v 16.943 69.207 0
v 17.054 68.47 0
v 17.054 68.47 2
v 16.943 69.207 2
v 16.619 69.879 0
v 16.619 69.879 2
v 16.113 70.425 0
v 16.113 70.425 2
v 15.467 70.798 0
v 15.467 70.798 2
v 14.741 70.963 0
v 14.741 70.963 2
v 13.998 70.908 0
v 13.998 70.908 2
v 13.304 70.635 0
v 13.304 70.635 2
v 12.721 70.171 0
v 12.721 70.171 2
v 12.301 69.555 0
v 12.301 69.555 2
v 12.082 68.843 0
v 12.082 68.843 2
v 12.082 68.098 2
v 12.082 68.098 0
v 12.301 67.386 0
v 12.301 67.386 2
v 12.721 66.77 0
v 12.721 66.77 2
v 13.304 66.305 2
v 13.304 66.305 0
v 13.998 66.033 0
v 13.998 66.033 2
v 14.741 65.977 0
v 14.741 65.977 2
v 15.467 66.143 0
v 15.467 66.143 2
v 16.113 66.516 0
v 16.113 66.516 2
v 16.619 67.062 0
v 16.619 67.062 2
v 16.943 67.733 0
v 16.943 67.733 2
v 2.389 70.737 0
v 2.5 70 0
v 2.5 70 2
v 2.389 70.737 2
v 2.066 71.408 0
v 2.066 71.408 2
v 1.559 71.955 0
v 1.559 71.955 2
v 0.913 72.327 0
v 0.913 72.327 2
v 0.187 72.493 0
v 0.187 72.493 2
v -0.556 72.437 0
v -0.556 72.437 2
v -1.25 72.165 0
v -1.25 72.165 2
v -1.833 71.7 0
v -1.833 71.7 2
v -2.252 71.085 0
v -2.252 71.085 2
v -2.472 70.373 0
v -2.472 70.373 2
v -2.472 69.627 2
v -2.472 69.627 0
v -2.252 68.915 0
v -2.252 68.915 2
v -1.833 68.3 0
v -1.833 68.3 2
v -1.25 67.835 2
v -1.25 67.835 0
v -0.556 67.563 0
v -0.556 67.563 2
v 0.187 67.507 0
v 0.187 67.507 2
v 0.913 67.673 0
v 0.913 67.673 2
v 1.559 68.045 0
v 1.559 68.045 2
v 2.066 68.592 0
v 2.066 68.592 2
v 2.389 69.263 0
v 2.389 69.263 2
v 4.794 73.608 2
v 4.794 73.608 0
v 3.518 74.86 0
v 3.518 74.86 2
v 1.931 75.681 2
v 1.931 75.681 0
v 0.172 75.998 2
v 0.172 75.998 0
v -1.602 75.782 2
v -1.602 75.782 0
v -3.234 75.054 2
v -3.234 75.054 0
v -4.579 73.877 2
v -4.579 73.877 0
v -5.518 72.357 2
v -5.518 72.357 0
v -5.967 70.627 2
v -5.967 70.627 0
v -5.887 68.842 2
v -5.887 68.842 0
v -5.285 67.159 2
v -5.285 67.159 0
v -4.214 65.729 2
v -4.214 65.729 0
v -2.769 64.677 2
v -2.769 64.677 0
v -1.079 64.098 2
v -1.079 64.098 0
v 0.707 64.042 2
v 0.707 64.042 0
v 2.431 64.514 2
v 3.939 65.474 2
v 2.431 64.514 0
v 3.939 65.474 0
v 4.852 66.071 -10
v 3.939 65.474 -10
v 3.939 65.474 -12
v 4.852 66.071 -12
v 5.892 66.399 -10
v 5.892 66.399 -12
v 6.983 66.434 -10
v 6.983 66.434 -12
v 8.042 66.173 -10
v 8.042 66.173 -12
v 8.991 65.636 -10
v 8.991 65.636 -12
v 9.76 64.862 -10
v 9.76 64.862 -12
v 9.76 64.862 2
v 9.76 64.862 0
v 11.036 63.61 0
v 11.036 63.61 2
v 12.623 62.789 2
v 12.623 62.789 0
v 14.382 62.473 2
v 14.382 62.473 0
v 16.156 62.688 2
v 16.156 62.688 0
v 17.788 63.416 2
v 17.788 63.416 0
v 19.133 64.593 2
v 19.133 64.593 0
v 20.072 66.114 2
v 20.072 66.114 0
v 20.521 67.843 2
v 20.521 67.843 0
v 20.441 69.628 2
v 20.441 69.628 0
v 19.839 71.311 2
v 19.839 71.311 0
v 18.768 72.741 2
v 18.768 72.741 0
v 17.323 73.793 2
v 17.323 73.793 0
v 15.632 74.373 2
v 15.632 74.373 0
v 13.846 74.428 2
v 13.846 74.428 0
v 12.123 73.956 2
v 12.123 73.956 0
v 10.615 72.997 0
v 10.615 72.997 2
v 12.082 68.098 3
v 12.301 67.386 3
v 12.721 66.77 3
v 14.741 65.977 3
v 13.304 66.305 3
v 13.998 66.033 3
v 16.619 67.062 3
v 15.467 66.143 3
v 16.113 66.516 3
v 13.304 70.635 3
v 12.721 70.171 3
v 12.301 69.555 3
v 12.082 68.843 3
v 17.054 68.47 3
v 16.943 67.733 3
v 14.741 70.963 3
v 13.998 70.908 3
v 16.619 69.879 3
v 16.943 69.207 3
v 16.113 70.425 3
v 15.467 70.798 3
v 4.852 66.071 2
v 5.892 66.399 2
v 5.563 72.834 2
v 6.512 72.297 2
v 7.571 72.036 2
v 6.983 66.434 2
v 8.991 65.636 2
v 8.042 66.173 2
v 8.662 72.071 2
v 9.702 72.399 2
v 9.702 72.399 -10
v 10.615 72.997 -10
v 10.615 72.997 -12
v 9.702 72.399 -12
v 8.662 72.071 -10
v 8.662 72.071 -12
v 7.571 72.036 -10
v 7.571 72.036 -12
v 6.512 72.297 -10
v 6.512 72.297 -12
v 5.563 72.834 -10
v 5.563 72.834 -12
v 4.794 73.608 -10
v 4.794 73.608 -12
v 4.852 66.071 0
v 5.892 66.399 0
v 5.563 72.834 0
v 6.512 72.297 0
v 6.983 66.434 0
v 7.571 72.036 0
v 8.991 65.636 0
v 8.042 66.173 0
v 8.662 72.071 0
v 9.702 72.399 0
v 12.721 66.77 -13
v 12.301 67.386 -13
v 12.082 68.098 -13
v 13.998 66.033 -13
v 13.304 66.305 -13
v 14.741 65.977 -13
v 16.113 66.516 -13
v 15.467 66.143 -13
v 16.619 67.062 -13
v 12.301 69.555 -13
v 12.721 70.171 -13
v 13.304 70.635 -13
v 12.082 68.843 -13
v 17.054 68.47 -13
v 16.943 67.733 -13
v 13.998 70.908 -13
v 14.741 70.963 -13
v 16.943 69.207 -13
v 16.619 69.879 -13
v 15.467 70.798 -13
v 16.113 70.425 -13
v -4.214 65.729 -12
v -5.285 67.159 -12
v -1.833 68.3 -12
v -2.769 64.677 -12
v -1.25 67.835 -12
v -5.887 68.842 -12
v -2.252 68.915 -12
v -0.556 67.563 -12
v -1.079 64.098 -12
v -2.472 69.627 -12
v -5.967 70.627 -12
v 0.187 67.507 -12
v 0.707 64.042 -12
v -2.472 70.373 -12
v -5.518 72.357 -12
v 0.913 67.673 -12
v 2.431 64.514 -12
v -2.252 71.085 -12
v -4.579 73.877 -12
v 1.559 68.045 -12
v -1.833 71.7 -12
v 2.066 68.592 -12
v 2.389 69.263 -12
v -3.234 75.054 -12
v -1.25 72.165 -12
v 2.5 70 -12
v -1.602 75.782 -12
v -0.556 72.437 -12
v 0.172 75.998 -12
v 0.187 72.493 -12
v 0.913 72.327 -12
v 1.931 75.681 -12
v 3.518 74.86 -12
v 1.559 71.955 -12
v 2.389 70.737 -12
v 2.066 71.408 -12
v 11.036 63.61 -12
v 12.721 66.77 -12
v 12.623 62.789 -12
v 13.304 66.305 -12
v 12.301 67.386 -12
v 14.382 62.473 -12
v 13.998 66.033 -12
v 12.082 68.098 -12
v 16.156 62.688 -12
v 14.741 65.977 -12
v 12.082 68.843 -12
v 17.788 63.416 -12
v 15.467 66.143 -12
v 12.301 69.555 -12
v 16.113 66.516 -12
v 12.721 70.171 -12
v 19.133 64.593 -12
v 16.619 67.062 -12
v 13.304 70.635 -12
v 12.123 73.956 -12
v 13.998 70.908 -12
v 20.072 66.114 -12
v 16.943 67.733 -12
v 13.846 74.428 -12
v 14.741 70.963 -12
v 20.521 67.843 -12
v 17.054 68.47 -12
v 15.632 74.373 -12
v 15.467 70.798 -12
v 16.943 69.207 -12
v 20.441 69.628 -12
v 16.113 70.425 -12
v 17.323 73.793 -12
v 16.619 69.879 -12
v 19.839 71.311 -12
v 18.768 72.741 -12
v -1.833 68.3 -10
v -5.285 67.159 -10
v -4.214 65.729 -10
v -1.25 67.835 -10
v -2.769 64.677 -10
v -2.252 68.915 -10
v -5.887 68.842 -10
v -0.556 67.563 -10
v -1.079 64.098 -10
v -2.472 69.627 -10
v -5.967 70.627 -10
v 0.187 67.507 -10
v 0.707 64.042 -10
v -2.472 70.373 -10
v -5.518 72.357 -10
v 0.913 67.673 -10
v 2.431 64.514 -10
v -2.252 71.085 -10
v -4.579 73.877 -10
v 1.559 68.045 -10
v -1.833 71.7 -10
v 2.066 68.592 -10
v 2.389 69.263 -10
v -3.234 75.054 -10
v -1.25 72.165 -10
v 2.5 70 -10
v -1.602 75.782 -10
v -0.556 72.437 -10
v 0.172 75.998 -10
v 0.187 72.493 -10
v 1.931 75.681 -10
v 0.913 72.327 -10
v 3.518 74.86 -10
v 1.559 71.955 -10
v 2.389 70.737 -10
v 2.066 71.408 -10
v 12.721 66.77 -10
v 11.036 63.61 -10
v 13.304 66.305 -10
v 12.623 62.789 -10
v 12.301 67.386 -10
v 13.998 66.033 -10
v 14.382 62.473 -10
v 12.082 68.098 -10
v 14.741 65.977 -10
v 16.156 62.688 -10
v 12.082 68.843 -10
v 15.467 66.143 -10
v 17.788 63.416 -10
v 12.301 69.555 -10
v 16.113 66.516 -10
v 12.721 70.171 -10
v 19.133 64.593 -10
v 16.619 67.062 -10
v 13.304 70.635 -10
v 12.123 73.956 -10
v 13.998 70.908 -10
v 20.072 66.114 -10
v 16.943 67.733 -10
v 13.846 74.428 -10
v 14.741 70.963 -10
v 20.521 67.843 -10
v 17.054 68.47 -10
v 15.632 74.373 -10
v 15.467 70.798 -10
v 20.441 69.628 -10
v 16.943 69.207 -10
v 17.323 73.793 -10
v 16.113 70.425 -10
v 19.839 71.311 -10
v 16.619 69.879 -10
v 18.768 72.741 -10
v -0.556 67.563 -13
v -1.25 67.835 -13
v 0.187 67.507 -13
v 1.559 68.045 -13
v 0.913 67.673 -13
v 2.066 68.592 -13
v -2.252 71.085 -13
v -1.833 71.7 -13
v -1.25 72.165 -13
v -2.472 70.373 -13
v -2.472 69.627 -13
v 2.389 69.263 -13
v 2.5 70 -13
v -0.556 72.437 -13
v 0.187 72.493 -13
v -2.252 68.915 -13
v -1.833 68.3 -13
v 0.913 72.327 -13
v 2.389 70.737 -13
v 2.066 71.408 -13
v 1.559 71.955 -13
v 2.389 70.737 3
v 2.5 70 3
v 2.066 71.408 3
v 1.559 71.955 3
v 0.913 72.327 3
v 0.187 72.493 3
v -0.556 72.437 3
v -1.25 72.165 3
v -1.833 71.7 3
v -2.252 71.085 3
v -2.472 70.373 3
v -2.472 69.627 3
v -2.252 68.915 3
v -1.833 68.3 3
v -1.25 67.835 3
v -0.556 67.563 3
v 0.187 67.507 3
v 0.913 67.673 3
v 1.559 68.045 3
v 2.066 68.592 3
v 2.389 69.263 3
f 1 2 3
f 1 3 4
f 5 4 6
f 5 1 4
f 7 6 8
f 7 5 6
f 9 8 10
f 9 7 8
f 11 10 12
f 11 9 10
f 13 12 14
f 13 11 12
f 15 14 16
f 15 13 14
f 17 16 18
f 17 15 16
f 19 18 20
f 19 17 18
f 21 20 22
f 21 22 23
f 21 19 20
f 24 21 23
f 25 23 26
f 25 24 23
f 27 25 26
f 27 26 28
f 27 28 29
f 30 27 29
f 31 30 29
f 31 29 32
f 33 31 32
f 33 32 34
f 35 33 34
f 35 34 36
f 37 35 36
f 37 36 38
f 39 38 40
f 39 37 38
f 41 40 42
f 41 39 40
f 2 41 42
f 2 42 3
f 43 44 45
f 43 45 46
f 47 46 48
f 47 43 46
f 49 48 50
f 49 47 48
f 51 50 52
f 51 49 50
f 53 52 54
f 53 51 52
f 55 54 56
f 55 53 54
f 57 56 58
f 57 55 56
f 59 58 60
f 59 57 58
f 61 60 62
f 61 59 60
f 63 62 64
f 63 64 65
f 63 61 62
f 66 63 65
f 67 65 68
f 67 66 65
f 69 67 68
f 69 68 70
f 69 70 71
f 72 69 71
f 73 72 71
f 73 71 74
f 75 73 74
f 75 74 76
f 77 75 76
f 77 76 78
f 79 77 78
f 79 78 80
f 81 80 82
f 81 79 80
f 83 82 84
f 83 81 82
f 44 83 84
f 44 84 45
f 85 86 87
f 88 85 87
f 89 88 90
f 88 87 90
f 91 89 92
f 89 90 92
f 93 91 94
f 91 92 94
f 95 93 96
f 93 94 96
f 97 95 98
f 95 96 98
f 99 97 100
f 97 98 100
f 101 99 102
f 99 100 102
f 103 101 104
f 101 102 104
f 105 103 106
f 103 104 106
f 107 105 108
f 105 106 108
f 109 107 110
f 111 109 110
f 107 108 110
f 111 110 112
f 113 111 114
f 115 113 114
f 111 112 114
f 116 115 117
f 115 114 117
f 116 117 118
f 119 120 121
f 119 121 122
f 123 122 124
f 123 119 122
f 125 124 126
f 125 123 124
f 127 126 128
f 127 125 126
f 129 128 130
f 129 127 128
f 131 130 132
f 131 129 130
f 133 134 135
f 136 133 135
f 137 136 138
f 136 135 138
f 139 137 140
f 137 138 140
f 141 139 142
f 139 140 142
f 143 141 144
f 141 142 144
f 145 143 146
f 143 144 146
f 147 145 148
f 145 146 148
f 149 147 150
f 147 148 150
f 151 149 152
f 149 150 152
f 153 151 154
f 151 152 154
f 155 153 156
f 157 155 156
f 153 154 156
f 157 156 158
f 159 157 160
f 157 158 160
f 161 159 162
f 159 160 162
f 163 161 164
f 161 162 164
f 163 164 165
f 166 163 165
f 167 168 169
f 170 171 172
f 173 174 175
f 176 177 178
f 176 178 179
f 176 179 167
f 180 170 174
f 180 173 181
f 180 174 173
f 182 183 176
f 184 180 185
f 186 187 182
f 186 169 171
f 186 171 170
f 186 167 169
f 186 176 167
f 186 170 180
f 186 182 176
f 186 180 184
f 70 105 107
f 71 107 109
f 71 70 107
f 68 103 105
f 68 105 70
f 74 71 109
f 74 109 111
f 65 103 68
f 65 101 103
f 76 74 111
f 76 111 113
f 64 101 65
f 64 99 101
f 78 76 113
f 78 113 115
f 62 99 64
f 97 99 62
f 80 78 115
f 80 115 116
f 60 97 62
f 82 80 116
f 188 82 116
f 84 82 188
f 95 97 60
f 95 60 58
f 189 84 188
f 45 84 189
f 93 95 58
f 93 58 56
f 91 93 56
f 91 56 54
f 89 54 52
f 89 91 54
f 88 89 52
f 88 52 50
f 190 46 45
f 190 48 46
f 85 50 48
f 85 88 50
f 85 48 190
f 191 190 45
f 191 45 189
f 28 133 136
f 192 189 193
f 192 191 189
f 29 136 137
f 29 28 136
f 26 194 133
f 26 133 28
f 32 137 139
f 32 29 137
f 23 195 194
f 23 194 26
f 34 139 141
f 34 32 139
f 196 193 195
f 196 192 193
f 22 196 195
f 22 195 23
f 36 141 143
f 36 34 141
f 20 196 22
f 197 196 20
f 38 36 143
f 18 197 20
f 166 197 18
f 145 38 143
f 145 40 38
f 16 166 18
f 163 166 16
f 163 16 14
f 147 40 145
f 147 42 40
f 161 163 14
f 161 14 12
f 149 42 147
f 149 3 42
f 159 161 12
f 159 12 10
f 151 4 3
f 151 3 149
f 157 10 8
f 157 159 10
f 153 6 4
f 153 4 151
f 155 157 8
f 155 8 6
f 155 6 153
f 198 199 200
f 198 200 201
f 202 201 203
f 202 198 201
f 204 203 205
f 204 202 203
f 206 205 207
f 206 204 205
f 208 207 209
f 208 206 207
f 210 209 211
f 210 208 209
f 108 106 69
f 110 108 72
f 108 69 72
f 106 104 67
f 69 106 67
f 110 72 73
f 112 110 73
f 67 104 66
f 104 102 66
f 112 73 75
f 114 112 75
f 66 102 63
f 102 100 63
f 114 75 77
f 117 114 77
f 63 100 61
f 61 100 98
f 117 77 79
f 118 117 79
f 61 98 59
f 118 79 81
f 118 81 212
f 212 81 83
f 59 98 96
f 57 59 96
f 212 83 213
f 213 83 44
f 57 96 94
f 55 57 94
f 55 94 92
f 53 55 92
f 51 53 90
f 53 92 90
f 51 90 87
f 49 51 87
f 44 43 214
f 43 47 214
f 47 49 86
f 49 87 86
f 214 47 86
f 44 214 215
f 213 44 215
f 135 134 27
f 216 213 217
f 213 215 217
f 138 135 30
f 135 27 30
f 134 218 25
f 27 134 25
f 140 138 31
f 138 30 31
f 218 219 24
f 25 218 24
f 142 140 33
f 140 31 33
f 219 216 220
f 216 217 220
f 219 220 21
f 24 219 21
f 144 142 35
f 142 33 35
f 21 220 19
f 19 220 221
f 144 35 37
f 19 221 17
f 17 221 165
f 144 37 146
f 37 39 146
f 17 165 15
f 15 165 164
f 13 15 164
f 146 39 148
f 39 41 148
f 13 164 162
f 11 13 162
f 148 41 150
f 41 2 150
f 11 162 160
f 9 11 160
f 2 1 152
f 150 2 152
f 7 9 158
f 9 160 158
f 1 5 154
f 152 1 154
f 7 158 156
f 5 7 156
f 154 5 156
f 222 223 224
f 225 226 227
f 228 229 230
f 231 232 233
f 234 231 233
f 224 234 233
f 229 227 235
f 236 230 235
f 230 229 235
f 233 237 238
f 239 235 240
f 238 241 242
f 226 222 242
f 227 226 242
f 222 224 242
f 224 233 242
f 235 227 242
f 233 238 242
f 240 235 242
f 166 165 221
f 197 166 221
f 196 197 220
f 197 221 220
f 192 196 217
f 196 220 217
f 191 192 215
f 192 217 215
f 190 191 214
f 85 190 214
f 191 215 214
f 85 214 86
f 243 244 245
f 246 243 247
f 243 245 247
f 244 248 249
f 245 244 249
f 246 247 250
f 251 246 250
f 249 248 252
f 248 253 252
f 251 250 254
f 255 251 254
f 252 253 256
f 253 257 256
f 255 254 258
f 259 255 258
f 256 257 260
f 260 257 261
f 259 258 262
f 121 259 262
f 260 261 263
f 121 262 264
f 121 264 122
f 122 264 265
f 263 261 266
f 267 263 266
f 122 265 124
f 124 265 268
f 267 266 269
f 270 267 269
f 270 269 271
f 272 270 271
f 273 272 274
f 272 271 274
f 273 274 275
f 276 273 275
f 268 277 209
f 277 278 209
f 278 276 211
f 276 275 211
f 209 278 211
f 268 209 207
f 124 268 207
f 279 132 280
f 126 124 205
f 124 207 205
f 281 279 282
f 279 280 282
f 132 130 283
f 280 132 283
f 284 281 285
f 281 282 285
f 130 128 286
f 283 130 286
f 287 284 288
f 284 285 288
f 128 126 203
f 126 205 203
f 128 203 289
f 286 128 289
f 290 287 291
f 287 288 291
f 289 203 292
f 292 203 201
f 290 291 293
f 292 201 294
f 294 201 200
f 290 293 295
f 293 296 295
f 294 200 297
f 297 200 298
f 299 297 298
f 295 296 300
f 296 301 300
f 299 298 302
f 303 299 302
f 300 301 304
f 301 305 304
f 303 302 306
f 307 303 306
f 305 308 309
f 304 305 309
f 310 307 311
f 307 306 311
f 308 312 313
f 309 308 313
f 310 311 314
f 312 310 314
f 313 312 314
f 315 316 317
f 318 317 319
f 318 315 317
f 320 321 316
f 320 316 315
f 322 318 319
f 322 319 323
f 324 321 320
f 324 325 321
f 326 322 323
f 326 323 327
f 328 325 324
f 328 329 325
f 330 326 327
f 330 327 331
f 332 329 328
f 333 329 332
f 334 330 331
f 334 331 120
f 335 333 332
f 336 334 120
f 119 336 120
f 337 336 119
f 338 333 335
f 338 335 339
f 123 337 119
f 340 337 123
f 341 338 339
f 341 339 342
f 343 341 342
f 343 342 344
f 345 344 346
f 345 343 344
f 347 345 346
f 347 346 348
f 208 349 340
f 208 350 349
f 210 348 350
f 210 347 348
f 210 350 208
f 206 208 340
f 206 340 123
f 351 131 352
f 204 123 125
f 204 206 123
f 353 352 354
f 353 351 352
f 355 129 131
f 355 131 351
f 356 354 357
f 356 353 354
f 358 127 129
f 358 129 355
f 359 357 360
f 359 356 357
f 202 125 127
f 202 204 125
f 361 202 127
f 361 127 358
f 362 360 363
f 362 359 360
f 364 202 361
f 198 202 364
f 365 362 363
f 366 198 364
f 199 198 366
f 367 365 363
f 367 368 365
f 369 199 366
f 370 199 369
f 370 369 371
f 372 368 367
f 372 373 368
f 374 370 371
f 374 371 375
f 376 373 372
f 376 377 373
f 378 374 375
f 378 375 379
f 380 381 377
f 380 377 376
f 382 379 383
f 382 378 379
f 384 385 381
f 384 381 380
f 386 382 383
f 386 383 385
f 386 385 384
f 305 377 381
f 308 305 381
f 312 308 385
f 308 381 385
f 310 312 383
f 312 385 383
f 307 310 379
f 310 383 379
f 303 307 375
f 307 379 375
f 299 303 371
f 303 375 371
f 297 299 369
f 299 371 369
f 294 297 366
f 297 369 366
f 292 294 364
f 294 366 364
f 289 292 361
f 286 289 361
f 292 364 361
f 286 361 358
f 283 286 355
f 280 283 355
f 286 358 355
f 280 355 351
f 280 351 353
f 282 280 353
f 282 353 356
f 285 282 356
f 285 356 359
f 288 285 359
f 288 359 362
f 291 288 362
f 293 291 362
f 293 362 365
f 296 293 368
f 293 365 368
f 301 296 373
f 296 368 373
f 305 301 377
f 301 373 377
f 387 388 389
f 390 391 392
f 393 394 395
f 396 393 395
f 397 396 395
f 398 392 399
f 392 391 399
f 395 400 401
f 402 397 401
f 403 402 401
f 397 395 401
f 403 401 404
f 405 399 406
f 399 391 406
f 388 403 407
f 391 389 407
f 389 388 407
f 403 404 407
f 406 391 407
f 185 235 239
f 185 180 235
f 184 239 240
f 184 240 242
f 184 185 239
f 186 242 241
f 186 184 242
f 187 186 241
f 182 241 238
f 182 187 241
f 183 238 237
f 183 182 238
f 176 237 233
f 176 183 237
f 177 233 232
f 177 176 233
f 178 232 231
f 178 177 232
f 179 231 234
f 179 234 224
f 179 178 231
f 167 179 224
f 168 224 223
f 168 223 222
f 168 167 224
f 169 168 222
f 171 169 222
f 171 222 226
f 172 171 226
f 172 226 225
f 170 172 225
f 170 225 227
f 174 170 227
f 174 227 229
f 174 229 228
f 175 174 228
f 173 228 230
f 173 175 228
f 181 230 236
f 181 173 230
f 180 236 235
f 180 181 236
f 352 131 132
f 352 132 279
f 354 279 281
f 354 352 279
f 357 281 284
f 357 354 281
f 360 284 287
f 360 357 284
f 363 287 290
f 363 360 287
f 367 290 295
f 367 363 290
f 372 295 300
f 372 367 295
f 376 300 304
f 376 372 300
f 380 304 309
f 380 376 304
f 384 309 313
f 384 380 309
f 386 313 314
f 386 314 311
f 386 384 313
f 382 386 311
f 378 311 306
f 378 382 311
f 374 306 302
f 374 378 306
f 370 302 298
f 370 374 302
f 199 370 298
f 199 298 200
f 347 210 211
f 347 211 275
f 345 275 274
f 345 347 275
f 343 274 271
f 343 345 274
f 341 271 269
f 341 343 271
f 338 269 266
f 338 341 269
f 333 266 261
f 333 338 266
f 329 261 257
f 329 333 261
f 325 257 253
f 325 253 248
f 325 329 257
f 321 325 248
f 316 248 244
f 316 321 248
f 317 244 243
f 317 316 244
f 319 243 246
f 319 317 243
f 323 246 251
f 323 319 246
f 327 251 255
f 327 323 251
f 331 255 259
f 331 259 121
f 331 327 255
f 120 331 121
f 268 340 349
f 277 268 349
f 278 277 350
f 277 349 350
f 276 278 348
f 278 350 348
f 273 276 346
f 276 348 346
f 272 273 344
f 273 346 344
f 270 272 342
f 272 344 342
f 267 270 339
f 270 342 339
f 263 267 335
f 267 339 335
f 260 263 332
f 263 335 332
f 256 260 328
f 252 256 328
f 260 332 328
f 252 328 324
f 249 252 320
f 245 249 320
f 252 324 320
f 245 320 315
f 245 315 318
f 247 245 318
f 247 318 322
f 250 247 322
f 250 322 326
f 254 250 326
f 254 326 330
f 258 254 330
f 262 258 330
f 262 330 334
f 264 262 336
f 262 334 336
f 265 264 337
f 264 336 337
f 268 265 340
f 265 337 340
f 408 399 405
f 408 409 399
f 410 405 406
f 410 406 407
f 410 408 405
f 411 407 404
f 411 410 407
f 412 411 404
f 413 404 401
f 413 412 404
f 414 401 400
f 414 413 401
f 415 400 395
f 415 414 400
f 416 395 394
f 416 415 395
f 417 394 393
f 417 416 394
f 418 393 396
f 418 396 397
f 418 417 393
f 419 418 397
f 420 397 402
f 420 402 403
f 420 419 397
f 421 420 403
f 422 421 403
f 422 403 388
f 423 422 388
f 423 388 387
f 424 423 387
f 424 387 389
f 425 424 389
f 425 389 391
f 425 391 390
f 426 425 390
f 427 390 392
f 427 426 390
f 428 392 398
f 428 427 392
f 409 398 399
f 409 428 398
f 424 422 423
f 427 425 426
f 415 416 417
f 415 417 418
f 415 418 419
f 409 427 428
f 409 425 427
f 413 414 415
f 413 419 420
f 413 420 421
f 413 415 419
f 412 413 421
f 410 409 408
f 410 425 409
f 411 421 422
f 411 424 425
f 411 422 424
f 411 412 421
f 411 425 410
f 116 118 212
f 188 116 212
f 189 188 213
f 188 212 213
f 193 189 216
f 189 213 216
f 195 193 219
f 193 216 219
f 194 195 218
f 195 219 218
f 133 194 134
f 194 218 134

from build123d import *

# Parameters (mm, degrees)
IZIM1_R                       = 2.5
Y_KSEKLIK_EKSTR_ZYON1_DEPTH   = 2
Y_KSEKLIK_EKSTR_ZYON2_START   = -10
IZIM1_2_R                     = 2.5
Y_KSEKLIK_EKSTR_ZYON2_DEPTH   = 2
Y_KSEKLIK_EKSTR_ZYON3_START   = -5
IZIM1_6_R                     = 2.5
Y_KSEKLIK_EKSTR_ZYON3_DEPTH   = 8
Y_KSEKLIK_EKSTR_ZYON3_2_DEPTH = 8


with BuildPart() as part:
    # Çizim1 → Yükseklik-Ekstrüzyon1 (new body)
    with BuildSketch(Plane.XY):
        with BuildLine():
            ThreePointArc((9.760175922, 64.861870856), (20.520949729, 67.843161272), (10.615169778, 72.996594016))
            ThreePointArc((10.615169778, 72.996594016), (7.571290206, 72.036014411), (4.793642436, 73.608461196))
            ThreePointArc((4.793642436, 73.608461196), (-5.967131372, 70.62717078), (3.938648579, 65.473738035))
            ThreePointArc((3.938648579, 65.473738035), (6.982528151, 66.43431764), (9.760175922, 64.861870856))
        make_face()
        with Locations((0, 70)):
            Circle(IZIM1_R, mode=Mode.SUBTRACT)
        with Locations((14.553818357, 68.470332051)):
            Circle(IZIM1_R, mode=Mode.SUBTRACT)
    extrude(amount=Y_KSEKLIK_EKSTR_ZYON1_DEPTH)


with BuildPart() as body_2:
    # Çizim1<2> → Yükseklik-Ekstrüzyon2 (new body)
    with BuildSketch(Plane.XY.offset(Y_KSEKLIK_EKSTR_ZYON2_START)):
        with BuildLine():
            ThreePointArc((9.760175922, 64.861870856), (20.520949729, 67.843161272), (10.615169778, 72.996594016))
            ThreePointArc((10.615169778, 72.996594016), (7.571290206, 72.036014411), (4.793642436, 73.608461196))
            ThreePointArc((4.793642436, 73.608461196), (-5.967131372, 70.62717078), (3.938648579, 65.473738035))
            ThreePointArc((3.938648579, 65.473738035), (6.982528151, 66.43431764), (9.760175922, 64.861870856))
        make_face()
        with Locations((0, 70)):
            Circle(IZIM1_2_R, mode=Mode.SUBTRACT)
        with Locations((14.553818357, 68.470332051)):
            Circle(IZIM1_2_R, mode=Mode.SUBTRACT)
    extrude(amount=-Y_KSEKLIK_EKSTR_ZYON2_DEPTH)


with BuildPart() as body_3:
    # Çizim1<6> → Yükseklik-Ekstrüzyon3 (new, symmetric)
    with BuildSketch(Plane.XY.offset(Y_KSEKLIK_EKSTR_ZYON3_START)):
        with Locations((0, 70)):
            Circle(IZIM1_6_R)
    extrude(amount=Y_KSEKLIK_EKSTR_ZYON3_DEPTH, both=True)


with BuildPart() as body_4:
    # Çizim1<6> → Y_kseklik-Ekstr_zyon3 2 (new, symmetric)
    with BuildSketch(Plane.XY.offset(Y_KSEKLIK_EKSTR_ZYON3_START)):
        with Locations((14.553818357, 68.470332051)):
            Circle(IZIM1_6_R)
    extrude(amount=Y_KSEKLIK_EKSTR_ZYON3_2_DEPTH, both=True)


solid = Compound([part.part, body_2.part, body_3.part, body_4.part])
